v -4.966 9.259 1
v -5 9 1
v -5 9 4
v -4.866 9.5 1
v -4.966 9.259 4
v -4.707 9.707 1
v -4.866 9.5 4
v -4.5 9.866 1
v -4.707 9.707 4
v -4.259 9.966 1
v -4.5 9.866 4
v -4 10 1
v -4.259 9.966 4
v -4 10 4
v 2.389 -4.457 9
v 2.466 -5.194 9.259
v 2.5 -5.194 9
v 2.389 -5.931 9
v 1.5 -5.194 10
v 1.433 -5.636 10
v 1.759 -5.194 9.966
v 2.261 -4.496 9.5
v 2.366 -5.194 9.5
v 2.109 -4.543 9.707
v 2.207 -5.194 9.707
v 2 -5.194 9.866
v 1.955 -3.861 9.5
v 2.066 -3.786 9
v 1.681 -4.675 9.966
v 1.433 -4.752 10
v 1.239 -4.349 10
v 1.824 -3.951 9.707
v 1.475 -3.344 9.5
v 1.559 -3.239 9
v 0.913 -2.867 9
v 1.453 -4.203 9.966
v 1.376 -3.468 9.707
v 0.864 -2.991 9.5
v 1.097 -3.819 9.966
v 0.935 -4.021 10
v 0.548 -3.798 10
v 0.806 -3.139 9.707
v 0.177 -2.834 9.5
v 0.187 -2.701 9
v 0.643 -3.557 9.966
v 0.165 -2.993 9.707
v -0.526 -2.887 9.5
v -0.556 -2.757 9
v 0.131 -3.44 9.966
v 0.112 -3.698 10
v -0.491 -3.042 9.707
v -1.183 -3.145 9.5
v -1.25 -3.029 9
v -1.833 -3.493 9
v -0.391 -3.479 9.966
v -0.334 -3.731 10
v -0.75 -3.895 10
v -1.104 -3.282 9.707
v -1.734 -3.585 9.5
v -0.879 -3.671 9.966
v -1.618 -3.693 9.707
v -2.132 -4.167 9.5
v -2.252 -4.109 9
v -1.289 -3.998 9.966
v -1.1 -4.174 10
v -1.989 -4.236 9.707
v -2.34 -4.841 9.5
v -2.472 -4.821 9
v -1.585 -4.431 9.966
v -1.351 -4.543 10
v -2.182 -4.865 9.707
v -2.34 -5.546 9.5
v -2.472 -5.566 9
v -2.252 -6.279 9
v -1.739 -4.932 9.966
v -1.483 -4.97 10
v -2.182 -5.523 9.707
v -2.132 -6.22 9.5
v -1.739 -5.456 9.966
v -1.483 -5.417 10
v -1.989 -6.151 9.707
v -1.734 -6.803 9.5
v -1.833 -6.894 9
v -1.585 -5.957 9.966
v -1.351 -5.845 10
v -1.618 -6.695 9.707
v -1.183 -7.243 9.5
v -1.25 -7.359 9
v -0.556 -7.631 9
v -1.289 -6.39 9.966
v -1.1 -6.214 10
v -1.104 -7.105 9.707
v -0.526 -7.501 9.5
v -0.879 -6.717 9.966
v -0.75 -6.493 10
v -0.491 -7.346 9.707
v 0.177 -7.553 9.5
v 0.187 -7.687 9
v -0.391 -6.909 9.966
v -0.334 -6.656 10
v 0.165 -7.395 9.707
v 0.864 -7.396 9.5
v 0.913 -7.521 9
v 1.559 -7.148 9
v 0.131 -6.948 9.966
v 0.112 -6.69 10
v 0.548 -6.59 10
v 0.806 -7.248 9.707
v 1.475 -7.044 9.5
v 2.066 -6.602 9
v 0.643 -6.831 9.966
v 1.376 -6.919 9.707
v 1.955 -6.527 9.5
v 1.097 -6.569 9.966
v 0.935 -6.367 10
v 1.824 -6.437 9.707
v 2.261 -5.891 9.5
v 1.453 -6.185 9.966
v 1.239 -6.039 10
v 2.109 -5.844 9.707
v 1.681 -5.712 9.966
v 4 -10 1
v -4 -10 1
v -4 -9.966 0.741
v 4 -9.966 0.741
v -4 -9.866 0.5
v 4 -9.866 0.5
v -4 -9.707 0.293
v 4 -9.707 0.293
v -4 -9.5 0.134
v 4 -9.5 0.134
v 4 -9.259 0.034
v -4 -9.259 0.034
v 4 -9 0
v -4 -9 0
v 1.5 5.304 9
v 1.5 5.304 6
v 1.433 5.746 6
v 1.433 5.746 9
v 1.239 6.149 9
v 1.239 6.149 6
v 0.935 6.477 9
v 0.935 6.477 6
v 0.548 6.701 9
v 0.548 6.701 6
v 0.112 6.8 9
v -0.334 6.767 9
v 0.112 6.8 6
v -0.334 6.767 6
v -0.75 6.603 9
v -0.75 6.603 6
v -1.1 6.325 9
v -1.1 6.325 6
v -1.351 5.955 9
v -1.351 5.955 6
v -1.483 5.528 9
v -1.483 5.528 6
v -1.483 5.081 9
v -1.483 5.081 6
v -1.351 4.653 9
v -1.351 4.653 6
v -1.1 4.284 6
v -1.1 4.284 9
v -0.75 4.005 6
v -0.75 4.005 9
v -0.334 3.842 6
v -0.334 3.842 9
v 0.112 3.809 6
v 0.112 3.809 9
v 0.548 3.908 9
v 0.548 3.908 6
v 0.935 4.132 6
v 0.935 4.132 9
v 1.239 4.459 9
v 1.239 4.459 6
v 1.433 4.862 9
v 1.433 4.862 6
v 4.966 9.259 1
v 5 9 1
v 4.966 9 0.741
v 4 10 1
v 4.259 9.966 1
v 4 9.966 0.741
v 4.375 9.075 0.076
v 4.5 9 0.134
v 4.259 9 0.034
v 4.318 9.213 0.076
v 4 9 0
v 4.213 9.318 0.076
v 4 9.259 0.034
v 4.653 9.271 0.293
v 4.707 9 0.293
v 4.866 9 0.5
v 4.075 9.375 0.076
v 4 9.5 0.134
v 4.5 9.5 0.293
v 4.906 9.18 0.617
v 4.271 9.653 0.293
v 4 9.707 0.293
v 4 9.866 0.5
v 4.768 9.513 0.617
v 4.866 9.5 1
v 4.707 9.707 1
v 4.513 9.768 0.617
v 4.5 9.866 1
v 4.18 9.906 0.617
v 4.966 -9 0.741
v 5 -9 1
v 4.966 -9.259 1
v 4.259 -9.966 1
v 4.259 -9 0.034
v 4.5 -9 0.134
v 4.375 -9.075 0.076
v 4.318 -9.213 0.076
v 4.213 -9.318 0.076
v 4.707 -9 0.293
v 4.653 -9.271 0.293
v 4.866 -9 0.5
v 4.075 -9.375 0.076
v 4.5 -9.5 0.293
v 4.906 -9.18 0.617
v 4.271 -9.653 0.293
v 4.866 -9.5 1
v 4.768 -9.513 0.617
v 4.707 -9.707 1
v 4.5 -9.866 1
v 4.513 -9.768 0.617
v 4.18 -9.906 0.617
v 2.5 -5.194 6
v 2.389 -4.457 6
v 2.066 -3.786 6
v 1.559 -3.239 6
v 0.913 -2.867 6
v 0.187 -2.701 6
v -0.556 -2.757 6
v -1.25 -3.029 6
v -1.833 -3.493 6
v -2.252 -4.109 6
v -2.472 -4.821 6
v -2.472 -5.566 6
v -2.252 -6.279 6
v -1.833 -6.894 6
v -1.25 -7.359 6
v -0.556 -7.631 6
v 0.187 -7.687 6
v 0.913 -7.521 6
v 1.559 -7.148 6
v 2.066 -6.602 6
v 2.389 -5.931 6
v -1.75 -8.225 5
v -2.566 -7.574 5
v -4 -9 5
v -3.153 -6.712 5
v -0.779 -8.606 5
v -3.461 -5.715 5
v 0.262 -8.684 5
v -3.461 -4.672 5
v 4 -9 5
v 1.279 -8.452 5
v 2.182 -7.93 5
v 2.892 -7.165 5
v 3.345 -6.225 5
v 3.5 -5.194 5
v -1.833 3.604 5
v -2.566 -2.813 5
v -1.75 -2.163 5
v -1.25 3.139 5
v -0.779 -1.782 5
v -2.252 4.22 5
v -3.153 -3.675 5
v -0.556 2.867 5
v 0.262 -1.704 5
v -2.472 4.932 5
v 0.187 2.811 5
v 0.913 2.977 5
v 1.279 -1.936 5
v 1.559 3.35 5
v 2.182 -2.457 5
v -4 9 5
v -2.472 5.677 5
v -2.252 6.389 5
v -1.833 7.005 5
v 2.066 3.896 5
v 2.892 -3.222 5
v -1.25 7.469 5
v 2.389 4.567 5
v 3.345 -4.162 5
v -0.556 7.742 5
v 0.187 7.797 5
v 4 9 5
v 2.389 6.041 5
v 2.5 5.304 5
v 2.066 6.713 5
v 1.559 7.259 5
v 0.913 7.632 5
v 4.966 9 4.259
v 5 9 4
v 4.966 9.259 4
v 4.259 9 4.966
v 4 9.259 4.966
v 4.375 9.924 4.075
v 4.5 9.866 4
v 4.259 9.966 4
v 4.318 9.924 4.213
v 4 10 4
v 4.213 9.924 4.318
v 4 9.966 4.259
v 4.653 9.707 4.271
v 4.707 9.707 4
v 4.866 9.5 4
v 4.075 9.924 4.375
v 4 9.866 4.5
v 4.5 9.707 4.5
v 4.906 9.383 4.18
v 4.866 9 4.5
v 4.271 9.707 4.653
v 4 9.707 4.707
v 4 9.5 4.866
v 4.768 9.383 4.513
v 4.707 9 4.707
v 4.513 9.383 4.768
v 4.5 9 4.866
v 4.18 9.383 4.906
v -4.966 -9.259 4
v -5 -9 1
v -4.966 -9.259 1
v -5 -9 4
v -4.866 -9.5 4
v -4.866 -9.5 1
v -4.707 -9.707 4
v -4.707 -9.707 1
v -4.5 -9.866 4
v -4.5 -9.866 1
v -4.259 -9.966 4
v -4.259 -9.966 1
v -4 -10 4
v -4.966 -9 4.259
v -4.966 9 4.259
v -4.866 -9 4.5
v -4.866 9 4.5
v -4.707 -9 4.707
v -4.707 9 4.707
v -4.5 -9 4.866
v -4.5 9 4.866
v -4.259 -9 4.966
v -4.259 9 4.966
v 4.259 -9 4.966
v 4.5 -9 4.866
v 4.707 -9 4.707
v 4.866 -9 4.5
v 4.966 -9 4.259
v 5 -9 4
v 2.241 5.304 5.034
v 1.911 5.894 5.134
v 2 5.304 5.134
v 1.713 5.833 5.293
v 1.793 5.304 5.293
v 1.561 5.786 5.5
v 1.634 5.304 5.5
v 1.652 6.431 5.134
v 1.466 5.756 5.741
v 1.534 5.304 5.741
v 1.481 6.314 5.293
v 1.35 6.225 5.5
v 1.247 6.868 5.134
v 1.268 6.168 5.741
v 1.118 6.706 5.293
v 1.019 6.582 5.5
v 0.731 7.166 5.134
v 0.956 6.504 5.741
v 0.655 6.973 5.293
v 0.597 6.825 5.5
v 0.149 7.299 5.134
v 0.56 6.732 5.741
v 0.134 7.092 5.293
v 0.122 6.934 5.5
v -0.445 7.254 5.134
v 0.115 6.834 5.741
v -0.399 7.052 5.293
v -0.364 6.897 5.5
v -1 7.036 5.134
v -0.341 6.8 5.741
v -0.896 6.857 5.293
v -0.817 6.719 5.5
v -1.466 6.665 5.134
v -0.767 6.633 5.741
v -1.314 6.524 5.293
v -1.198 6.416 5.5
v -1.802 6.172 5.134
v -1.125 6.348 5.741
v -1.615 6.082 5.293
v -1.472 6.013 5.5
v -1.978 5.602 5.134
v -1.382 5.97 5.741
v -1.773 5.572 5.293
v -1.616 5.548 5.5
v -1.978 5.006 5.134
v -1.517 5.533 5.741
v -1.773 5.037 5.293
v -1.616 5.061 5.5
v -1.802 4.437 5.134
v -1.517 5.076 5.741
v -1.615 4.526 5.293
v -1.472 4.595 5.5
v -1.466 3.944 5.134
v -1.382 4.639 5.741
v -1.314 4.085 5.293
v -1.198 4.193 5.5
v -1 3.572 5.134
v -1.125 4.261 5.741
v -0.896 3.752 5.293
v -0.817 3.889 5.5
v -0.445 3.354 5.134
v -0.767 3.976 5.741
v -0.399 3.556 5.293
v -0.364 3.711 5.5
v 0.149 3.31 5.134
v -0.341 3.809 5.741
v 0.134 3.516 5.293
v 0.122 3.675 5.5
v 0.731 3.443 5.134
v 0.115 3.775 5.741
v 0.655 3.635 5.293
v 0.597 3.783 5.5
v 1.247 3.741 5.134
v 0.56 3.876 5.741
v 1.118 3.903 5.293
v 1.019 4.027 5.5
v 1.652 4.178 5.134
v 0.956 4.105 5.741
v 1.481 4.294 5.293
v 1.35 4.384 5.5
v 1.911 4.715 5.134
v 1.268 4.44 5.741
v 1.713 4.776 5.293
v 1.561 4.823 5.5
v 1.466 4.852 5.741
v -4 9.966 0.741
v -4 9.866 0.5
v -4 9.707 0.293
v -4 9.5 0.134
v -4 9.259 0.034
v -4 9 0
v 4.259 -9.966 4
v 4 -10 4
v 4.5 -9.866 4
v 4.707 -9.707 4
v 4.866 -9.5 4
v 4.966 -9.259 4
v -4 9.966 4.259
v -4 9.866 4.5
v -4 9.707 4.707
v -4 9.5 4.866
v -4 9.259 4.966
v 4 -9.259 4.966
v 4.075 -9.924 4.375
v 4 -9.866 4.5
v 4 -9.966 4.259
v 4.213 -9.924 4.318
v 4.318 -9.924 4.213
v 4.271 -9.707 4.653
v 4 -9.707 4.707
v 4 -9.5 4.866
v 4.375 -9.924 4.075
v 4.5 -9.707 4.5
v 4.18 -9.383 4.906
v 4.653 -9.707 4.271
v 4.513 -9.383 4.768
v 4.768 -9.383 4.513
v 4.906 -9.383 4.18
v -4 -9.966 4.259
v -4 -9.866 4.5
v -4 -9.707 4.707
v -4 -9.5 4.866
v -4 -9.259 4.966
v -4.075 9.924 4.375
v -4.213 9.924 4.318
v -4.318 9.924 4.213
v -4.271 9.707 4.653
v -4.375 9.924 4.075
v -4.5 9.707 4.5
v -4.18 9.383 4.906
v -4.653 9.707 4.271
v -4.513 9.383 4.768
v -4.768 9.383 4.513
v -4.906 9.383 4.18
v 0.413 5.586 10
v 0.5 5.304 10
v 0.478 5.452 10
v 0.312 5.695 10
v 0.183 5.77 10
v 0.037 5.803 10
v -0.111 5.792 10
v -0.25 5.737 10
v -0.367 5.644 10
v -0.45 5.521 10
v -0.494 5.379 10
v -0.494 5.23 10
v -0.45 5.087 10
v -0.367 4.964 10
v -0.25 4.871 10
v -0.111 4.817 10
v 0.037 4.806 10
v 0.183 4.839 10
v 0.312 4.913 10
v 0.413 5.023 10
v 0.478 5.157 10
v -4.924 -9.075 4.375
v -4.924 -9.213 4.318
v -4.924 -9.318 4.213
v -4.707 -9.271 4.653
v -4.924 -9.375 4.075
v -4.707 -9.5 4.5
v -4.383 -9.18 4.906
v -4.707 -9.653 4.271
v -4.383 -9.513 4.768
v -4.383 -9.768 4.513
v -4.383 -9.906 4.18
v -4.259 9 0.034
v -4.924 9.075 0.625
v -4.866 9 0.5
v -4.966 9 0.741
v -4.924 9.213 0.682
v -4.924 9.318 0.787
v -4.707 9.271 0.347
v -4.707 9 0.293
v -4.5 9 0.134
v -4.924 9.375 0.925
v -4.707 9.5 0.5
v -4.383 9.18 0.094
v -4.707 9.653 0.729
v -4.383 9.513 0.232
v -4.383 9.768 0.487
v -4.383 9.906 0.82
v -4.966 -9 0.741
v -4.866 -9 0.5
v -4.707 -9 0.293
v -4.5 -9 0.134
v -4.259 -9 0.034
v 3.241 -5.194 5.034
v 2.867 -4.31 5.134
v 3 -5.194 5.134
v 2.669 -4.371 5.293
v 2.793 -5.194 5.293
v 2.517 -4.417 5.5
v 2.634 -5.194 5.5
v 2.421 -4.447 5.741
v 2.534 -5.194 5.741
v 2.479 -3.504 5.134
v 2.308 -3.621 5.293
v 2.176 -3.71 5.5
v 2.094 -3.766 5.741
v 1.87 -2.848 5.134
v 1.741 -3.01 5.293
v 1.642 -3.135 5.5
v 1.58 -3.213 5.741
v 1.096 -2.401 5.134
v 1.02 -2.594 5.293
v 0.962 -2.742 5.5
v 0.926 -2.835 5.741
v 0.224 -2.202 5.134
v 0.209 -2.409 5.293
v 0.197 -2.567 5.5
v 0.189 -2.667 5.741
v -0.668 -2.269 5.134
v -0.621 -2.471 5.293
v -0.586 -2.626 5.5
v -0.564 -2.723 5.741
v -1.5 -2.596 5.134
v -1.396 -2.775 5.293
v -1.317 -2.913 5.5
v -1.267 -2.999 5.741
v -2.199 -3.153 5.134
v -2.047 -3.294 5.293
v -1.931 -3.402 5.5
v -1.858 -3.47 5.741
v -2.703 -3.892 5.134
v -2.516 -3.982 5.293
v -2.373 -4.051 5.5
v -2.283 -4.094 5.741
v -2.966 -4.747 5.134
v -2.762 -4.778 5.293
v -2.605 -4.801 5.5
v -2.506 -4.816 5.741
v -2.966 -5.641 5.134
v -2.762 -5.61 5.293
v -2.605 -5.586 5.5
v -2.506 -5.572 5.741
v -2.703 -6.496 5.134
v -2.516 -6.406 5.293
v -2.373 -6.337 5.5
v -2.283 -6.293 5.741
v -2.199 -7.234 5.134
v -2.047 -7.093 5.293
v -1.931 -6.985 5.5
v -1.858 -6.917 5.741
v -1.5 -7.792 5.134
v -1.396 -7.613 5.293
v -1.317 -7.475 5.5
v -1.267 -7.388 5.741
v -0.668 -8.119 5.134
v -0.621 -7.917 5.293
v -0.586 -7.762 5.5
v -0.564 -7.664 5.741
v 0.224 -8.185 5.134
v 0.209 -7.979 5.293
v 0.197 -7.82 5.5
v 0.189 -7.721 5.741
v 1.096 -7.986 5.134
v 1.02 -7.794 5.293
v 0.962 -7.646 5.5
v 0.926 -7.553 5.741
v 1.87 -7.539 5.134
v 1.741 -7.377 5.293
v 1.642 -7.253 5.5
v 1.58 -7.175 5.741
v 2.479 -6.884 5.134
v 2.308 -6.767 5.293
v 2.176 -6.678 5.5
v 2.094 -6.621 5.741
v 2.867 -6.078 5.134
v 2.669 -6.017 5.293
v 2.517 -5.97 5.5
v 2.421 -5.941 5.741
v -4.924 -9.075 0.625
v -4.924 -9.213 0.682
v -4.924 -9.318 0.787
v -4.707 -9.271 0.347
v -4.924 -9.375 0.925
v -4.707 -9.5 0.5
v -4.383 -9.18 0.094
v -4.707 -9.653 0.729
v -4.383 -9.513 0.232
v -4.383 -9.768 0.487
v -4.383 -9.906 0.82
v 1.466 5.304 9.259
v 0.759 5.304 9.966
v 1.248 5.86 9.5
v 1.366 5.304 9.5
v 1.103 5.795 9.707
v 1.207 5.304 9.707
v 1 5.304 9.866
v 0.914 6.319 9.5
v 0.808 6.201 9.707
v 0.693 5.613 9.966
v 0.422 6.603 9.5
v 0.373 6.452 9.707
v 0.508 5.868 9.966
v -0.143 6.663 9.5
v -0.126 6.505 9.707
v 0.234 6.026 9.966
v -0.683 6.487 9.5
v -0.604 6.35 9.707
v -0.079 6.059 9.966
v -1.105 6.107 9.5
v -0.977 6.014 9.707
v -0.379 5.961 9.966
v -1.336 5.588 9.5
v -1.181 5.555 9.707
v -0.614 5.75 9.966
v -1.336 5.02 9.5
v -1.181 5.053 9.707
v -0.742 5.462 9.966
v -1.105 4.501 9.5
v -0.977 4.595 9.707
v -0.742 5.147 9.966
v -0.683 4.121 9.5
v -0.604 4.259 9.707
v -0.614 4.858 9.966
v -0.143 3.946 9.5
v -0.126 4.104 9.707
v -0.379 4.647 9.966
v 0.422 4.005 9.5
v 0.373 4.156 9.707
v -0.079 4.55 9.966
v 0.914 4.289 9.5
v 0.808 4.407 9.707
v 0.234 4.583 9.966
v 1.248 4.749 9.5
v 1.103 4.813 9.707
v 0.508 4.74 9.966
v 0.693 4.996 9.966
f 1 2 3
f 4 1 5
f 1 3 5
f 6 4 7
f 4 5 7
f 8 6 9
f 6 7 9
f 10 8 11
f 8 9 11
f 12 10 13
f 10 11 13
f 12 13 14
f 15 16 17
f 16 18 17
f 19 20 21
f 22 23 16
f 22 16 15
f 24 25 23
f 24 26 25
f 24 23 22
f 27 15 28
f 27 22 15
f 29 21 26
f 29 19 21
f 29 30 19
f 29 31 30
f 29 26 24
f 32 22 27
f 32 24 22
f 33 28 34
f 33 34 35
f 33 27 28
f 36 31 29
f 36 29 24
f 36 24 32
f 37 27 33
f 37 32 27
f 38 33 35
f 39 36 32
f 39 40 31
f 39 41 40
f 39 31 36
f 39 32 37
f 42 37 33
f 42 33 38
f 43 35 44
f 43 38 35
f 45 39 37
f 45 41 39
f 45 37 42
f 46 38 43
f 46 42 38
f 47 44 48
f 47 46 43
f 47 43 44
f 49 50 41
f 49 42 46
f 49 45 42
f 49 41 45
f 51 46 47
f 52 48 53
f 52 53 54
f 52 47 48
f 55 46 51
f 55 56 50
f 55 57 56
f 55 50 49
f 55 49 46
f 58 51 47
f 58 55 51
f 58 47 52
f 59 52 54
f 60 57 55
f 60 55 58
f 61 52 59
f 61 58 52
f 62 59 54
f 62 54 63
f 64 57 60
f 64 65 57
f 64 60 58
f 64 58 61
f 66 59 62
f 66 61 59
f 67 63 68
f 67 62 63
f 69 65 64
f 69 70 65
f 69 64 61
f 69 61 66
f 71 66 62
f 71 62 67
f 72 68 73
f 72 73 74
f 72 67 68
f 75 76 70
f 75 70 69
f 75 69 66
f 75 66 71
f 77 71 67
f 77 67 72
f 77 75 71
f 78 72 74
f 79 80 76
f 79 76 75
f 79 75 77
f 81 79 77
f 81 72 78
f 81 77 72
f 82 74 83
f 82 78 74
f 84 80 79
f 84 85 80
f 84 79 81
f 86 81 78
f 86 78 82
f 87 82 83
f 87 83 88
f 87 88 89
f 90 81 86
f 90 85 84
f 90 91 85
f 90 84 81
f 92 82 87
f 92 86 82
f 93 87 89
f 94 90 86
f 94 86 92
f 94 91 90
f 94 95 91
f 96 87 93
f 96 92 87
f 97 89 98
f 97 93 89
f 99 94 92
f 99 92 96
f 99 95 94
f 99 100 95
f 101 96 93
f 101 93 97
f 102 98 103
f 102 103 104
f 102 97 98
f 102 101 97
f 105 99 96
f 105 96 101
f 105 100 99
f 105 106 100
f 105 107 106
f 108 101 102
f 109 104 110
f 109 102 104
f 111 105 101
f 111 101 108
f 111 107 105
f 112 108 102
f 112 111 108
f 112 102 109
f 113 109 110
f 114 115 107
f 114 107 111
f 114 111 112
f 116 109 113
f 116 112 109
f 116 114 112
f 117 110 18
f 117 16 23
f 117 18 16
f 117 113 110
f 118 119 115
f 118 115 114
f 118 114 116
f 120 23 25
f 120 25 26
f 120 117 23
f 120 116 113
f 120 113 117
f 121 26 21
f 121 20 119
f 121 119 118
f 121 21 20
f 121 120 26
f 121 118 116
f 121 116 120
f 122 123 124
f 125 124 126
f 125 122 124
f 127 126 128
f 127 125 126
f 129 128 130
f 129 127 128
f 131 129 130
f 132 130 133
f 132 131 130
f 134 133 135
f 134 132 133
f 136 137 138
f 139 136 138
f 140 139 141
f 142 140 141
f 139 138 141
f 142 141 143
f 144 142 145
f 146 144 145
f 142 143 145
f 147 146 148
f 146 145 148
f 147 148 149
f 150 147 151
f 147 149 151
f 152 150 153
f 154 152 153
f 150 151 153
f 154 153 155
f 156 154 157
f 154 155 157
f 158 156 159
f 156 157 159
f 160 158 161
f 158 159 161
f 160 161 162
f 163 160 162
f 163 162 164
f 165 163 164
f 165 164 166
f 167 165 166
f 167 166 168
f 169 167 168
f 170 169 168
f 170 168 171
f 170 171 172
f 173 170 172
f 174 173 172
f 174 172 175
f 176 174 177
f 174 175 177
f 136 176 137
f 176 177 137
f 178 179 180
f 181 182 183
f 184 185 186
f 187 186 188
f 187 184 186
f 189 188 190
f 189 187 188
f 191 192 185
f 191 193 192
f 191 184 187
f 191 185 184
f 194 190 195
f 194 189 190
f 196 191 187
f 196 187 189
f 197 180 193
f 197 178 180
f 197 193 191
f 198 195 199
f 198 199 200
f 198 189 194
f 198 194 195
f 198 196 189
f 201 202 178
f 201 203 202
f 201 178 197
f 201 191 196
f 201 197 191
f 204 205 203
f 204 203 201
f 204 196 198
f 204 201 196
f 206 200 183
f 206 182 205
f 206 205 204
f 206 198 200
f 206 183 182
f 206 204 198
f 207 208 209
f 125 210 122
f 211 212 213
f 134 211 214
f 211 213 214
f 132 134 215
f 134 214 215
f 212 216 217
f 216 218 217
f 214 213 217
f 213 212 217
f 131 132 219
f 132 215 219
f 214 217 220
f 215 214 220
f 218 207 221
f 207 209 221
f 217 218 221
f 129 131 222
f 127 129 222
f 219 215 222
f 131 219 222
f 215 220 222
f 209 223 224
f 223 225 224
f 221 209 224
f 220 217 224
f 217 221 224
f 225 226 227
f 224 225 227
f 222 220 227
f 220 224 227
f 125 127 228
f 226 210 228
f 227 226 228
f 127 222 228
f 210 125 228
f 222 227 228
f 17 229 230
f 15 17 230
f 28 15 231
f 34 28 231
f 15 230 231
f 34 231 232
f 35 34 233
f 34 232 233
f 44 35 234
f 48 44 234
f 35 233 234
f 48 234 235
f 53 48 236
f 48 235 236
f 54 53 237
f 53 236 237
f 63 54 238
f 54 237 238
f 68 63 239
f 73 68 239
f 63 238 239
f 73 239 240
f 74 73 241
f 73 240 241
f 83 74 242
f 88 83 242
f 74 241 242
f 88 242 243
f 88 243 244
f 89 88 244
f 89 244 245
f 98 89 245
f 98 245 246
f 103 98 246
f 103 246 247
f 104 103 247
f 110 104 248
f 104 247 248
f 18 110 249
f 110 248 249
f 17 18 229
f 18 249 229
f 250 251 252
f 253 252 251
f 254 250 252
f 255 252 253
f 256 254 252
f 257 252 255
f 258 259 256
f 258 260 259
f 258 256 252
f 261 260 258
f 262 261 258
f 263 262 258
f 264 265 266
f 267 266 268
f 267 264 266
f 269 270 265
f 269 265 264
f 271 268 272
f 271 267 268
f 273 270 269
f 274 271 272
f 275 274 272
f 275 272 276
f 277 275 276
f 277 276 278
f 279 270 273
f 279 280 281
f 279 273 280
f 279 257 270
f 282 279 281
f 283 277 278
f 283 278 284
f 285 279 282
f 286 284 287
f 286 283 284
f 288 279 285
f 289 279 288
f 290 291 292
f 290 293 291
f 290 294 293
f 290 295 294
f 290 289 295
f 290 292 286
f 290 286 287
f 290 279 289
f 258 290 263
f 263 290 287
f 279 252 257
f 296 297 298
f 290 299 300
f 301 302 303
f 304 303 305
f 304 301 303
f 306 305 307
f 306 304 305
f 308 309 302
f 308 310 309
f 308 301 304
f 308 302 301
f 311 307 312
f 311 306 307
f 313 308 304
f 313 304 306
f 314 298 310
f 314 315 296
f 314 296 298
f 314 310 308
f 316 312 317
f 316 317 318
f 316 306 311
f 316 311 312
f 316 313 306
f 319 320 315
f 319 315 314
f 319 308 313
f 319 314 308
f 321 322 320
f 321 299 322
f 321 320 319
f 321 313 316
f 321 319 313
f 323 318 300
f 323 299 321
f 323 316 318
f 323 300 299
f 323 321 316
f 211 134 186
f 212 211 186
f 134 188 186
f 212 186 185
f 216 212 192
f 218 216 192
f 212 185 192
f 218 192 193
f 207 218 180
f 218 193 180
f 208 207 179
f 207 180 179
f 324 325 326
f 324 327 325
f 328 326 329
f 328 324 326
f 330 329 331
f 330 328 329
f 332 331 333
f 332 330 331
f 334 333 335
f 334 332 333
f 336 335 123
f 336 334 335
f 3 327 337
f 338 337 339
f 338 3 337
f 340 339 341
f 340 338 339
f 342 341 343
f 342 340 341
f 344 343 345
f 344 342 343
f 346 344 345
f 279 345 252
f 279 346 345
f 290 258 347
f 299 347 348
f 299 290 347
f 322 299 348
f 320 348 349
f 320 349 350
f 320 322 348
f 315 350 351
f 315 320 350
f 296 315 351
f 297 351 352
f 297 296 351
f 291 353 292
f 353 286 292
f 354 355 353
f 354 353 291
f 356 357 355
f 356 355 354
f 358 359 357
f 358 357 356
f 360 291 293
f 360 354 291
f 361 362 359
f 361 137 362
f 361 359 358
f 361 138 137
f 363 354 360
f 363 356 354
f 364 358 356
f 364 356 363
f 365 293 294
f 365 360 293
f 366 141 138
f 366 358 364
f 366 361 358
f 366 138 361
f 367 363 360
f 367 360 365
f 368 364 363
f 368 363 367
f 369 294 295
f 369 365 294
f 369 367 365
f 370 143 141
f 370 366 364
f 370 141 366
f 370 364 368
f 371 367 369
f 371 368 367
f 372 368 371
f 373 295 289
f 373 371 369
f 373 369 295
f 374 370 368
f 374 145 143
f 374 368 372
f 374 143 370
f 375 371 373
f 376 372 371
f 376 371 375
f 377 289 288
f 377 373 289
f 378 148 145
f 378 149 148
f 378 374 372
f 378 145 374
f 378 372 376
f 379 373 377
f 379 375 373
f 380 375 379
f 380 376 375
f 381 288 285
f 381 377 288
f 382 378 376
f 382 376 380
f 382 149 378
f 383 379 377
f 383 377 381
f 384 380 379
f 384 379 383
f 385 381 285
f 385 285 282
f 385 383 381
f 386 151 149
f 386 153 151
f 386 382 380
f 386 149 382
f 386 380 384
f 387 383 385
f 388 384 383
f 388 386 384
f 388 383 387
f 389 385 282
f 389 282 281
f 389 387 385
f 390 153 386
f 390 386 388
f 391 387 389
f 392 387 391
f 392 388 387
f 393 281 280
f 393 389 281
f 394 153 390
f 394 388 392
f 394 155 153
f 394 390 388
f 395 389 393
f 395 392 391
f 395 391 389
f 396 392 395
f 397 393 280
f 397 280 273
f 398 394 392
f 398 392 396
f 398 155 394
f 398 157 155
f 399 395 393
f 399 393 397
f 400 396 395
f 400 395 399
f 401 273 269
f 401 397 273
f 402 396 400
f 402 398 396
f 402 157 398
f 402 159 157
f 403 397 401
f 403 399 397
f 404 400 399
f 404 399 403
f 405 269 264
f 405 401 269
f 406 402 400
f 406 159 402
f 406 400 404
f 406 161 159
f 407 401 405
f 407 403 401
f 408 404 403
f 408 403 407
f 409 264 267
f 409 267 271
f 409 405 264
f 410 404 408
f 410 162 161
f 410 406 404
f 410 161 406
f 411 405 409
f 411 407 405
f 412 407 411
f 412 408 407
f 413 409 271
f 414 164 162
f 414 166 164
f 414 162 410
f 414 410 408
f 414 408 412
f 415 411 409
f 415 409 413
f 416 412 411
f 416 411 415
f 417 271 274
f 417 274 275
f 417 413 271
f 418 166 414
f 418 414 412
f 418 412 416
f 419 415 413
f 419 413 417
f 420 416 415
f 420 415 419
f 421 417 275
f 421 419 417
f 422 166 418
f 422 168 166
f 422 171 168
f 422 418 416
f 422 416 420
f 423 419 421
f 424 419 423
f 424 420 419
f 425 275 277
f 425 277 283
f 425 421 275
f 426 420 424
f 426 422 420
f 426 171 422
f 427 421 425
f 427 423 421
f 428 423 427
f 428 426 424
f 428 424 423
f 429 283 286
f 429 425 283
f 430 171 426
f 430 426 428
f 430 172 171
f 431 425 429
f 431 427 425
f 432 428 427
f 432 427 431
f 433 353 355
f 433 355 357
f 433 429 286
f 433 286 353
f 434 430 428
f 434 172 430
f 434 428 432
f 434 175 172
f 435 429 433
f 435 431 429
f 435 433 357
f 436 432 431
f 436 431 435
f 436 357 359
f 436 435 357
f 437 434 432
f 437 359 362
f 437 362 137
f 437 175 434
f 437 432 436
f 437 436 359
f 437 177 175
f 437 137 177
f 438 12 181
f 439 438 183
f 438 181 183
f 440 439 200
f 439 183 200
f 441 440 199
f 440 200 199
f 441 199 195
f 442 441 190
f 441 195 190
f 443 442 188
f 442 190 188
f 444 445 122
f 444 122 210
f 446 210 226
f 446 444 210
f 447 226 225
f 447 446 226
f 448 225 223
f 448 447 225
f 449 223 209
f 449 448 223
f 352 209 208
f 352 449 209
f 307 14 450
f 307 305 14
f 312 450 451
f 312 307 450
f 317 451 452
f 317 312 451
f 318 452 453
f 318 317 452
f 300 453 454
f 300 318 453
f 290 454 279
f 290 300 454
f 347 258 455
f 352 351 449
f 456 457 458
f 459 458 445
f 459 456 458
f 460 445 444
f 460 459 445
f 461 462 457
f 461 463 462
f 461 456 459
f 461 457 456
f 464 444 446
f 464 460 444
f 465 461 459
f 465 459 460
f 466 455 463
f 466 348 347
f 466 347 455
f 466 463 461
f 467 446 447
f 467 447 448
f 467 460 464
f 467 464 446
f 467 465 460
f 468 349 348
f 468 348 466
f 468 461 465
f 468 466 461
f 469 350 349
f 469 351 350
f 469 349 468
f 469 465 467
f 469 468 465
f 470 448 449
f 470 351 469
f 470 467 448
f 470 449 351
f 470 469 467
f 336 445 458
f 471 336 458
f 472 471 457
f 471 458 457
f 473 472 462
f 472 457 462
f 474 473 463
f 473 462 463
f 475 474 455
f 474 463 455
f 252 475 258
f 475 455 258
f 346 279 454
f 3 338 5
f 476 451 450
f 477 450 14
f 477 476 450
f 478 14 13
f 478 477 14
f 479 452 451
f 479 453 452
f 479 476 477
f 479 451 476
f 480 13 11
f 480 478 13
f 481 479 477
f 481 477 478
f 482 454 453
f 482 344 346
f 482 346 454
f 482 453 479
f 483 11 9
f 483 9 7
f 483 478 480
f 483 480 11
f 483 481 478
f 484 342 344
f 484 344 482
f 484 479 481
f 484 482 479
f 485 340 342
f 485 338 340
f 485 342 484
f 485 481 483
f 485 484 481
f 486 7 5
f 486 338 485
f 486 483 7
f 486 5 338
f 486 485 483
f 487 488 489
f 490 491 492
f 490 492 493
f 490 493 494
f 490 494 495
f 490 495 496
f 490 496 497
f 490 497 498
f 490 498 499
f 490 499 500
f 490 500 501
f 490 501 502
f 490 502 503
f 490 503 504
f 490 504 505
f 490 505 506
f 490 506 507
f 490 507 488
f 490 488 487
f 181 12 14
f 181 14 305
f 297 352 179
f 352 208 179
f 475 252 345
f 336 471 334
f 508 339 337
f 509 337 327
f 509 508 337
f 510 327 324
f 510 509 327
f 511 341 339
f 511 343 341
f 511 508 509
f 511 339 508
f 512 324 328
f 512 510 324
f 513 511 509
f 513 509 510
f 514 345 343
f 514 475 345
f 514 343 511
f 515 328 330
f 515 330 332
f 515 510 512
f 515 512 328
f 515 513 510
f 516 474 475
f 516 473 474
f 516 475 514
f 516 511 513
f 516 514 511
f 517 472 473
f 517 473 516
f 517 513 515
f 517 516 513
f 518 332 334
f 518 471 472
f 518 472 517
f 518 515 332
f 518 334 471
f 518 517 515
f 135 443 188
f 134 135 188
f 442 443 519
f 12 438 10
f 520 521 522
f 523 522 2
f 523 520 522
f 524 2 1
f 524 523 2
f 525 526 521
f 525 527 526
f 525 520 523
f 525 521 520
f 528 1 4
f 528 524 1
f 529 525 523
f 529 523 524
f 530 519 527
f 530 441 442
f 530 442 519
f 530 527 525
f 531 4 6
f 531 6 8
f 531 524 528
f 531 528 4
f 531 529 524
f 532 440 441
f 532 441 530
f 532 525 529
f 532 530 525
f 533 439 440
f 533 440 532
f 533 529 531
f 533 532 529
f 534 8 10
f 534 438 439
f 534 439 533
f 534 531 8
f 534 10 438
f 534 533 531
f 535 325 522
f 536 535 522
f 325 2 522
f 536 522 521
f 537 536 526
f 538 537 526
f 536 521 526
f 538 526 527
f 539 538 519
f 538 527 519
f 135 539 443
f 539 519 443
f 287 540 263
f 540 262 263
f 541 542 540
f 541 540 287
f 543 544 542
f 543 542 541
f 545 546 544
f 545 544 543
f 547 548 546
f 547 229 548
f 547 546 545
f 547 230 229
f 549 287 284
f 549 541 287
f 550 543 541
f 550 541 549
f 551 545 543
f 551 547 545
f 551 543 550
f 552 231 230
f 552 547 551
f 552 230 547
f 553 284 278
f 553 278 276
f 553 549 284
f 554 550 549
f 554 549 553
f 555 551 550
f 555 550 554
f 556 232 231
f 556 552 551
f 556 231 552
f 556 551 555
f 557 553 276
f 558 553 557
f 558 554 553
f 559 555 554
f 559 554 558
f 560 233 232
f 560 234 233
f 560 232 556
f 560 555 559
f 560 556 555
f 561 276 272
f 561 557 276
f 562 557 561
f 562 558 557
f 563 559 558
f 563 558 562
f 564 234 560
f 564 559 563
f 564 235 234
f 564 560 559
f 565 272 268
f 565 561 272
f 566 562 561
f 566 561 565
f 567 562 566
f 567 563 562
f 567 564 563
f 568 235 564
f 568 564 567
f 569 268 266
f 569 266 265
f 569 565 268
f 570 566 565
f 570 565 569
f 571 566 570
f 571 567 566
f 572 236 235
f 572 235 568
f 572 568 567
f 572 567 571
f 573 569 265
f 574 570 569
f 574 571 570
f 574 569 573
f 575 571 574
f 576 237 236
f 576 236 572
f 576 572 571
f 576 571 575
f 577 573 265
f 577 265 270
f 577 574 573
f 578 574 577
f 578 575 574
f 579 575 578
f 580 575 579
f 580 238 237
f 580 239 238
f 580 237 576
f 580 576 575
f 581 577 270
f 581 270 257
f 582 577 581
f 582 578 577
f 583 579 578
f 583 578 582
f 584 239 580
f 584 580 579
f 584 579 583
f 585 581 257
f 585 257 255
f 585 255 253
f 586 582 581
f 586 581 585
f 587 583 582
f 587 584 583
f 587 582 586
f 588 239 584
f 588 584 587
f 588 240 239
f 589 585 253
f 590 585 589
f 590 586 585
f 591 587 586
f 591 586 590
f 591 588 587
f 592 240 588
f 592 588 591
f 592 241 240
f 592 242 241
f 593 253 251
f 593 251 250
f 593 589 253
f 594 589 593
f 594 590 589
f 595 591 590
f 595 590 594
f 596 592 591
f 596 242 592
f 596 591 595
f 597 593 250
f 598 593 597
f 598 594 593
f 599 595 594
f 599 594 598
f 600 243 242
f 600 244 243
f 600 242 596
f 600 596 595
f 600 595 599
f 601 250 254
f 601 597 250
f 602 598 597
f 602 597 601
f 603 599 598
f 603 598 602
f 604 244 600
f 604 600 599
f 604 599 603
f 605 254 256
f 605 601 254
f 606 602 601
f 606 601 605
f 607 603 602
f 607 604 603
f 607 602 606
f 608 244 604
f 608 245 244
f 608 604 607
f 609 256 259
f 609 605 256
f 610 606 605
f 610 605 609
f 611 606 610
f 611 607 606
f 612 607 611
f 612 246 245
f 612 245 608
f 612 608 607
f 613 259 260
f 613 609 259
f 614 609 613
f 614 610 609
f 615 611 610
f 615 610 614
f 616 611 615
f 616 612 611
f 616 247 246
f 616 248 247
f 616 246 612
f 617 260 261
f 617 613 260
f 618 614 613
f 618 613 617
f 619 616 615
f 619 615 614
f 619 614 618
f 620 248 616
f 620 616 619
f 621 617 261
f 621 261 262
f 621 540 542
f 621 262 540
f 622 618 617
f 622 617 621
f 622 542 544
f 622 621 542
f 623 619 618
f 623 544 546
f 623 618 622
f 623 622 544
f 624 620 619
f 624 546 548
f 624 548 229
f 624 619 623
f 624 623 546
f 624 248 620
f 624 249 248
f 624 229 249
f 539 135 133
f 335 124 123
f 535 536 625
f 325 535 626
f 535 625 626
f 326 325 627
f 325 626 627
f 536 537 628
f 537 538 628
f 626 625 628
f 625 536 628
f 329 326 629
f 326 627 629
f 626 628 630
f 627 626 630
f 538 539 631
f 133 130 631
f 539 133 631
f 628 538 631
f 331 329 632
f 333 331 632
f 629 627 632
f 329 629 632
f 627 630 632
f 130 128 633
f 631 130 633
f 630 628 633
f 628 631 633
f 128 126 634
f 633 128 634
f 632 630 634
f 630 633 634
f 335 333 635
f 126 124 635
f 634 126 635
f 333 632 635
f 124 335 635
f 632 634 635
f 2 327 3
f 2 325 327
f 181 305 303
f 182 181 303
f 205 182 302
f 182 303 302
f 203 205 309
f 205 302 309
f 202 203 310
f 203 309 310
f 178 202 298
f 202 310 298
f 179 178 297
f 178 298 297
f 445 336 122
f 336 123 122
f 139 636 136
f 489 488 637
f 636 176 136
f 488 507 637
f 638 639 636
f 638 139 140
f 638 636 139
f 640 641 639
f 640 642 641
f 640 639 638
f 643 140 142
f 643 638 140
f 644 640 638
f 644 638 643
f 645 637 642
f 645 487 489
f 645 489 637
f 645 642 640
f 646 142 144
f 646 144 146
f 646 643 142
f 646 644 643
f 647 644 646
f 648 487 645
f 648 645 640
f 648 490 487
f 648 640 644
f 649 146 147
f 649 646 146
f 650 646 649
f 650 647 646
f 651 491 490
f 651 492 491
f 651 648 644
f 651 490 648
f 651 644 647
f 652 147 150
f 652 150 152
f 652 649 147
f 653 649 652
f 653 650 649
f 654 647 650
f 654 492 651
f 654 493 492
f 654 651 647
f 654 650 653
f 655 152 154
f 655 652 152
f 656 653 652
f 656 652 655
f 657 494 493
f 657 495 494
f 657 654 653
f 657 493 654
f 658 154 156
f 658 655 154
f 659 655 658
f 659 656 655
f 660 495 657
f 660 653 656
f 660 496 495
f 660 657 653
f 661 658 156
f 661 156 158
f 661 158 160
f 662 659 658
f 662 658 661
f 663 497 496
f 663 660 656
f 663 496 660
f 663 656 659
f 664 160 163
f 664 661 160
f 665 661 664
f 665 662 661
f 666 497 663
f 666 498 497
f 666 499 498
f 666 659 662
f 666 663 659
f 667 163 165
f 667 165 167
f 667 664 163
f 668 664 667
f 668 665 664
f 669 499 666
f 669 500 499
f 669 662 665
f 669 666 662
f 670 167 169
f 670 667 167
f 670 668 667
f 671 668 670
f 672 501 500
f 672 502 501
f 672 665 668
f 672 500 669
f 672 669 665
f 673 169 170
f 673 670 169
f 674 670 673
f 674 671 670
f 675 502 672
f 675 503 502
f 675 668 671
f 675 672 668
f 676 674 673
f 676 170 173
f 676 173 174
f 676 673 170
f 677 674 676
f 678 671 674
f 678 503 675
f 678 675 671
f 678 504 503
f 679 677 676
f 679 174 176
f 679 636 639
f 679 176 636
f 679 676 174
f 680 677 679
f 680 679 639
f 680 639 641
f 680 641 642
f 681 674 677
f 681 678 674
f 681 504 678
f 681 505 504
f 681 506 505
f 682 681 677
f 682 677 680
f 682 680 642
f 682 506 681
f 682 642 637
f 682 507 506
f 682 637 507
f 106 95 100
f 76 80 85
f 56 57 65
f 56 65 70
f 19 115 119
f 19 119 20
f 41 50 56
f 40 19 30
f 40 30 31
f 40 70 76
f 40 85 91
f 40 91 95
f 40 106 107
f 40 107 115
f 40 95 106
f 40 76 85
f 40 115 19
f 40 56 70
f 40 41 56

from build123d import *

# Parameters (mm, degrees)
F0_W     = 10
F0_H     = 20
F1_DEPTH = 5
F2_R     = 1.5
F2_R_2   = 2.5
F3_DEPTH = 5
F4_R     = 1


with BuildPart() as f1:
    # F0 (on Top) → F1 (new body)
    with BuildSketch(Plane.XY):
        Rectangle(F0_W, F0_H)
    extrude(amount=F1_DEPTH)

    # F2 (on face) → F3 (join)
    with BuildSketch(Plane.XY.offset(5)):
        with Locations((0, 5.30432)):
            Circle(F2_R)
        with Locations((0, -5.19385)):
            Circle(F2_R_2)
    extrude(amount=F3_DEPTH)

    # F4
    f4_edges = [f1.edges().sort_by_distance(p)[0] for p in [
        (5, 0, 5),
        (0, -10, 5),
        (5, -10, 2.5),
        (5, 10, 2.5),
        (5, 0, 0),
        (-5, 0, 5),
        (0, 10, 5),
        (0, -10, 0),
        (0, 10, 0),
        (-5, 0, 0),
        (-5, -10, 2.5),
        (-5, 10, 2.5),
        (-2.5, -5.19385, 10),
        (-1.5, 5.30432, 10),
        (-1.5, 5.30432, 5),
        (-2.5, -5.19385, 5),
    ]]
    fillet(f4_edges, radius=F4_R)


solid = f1.part
